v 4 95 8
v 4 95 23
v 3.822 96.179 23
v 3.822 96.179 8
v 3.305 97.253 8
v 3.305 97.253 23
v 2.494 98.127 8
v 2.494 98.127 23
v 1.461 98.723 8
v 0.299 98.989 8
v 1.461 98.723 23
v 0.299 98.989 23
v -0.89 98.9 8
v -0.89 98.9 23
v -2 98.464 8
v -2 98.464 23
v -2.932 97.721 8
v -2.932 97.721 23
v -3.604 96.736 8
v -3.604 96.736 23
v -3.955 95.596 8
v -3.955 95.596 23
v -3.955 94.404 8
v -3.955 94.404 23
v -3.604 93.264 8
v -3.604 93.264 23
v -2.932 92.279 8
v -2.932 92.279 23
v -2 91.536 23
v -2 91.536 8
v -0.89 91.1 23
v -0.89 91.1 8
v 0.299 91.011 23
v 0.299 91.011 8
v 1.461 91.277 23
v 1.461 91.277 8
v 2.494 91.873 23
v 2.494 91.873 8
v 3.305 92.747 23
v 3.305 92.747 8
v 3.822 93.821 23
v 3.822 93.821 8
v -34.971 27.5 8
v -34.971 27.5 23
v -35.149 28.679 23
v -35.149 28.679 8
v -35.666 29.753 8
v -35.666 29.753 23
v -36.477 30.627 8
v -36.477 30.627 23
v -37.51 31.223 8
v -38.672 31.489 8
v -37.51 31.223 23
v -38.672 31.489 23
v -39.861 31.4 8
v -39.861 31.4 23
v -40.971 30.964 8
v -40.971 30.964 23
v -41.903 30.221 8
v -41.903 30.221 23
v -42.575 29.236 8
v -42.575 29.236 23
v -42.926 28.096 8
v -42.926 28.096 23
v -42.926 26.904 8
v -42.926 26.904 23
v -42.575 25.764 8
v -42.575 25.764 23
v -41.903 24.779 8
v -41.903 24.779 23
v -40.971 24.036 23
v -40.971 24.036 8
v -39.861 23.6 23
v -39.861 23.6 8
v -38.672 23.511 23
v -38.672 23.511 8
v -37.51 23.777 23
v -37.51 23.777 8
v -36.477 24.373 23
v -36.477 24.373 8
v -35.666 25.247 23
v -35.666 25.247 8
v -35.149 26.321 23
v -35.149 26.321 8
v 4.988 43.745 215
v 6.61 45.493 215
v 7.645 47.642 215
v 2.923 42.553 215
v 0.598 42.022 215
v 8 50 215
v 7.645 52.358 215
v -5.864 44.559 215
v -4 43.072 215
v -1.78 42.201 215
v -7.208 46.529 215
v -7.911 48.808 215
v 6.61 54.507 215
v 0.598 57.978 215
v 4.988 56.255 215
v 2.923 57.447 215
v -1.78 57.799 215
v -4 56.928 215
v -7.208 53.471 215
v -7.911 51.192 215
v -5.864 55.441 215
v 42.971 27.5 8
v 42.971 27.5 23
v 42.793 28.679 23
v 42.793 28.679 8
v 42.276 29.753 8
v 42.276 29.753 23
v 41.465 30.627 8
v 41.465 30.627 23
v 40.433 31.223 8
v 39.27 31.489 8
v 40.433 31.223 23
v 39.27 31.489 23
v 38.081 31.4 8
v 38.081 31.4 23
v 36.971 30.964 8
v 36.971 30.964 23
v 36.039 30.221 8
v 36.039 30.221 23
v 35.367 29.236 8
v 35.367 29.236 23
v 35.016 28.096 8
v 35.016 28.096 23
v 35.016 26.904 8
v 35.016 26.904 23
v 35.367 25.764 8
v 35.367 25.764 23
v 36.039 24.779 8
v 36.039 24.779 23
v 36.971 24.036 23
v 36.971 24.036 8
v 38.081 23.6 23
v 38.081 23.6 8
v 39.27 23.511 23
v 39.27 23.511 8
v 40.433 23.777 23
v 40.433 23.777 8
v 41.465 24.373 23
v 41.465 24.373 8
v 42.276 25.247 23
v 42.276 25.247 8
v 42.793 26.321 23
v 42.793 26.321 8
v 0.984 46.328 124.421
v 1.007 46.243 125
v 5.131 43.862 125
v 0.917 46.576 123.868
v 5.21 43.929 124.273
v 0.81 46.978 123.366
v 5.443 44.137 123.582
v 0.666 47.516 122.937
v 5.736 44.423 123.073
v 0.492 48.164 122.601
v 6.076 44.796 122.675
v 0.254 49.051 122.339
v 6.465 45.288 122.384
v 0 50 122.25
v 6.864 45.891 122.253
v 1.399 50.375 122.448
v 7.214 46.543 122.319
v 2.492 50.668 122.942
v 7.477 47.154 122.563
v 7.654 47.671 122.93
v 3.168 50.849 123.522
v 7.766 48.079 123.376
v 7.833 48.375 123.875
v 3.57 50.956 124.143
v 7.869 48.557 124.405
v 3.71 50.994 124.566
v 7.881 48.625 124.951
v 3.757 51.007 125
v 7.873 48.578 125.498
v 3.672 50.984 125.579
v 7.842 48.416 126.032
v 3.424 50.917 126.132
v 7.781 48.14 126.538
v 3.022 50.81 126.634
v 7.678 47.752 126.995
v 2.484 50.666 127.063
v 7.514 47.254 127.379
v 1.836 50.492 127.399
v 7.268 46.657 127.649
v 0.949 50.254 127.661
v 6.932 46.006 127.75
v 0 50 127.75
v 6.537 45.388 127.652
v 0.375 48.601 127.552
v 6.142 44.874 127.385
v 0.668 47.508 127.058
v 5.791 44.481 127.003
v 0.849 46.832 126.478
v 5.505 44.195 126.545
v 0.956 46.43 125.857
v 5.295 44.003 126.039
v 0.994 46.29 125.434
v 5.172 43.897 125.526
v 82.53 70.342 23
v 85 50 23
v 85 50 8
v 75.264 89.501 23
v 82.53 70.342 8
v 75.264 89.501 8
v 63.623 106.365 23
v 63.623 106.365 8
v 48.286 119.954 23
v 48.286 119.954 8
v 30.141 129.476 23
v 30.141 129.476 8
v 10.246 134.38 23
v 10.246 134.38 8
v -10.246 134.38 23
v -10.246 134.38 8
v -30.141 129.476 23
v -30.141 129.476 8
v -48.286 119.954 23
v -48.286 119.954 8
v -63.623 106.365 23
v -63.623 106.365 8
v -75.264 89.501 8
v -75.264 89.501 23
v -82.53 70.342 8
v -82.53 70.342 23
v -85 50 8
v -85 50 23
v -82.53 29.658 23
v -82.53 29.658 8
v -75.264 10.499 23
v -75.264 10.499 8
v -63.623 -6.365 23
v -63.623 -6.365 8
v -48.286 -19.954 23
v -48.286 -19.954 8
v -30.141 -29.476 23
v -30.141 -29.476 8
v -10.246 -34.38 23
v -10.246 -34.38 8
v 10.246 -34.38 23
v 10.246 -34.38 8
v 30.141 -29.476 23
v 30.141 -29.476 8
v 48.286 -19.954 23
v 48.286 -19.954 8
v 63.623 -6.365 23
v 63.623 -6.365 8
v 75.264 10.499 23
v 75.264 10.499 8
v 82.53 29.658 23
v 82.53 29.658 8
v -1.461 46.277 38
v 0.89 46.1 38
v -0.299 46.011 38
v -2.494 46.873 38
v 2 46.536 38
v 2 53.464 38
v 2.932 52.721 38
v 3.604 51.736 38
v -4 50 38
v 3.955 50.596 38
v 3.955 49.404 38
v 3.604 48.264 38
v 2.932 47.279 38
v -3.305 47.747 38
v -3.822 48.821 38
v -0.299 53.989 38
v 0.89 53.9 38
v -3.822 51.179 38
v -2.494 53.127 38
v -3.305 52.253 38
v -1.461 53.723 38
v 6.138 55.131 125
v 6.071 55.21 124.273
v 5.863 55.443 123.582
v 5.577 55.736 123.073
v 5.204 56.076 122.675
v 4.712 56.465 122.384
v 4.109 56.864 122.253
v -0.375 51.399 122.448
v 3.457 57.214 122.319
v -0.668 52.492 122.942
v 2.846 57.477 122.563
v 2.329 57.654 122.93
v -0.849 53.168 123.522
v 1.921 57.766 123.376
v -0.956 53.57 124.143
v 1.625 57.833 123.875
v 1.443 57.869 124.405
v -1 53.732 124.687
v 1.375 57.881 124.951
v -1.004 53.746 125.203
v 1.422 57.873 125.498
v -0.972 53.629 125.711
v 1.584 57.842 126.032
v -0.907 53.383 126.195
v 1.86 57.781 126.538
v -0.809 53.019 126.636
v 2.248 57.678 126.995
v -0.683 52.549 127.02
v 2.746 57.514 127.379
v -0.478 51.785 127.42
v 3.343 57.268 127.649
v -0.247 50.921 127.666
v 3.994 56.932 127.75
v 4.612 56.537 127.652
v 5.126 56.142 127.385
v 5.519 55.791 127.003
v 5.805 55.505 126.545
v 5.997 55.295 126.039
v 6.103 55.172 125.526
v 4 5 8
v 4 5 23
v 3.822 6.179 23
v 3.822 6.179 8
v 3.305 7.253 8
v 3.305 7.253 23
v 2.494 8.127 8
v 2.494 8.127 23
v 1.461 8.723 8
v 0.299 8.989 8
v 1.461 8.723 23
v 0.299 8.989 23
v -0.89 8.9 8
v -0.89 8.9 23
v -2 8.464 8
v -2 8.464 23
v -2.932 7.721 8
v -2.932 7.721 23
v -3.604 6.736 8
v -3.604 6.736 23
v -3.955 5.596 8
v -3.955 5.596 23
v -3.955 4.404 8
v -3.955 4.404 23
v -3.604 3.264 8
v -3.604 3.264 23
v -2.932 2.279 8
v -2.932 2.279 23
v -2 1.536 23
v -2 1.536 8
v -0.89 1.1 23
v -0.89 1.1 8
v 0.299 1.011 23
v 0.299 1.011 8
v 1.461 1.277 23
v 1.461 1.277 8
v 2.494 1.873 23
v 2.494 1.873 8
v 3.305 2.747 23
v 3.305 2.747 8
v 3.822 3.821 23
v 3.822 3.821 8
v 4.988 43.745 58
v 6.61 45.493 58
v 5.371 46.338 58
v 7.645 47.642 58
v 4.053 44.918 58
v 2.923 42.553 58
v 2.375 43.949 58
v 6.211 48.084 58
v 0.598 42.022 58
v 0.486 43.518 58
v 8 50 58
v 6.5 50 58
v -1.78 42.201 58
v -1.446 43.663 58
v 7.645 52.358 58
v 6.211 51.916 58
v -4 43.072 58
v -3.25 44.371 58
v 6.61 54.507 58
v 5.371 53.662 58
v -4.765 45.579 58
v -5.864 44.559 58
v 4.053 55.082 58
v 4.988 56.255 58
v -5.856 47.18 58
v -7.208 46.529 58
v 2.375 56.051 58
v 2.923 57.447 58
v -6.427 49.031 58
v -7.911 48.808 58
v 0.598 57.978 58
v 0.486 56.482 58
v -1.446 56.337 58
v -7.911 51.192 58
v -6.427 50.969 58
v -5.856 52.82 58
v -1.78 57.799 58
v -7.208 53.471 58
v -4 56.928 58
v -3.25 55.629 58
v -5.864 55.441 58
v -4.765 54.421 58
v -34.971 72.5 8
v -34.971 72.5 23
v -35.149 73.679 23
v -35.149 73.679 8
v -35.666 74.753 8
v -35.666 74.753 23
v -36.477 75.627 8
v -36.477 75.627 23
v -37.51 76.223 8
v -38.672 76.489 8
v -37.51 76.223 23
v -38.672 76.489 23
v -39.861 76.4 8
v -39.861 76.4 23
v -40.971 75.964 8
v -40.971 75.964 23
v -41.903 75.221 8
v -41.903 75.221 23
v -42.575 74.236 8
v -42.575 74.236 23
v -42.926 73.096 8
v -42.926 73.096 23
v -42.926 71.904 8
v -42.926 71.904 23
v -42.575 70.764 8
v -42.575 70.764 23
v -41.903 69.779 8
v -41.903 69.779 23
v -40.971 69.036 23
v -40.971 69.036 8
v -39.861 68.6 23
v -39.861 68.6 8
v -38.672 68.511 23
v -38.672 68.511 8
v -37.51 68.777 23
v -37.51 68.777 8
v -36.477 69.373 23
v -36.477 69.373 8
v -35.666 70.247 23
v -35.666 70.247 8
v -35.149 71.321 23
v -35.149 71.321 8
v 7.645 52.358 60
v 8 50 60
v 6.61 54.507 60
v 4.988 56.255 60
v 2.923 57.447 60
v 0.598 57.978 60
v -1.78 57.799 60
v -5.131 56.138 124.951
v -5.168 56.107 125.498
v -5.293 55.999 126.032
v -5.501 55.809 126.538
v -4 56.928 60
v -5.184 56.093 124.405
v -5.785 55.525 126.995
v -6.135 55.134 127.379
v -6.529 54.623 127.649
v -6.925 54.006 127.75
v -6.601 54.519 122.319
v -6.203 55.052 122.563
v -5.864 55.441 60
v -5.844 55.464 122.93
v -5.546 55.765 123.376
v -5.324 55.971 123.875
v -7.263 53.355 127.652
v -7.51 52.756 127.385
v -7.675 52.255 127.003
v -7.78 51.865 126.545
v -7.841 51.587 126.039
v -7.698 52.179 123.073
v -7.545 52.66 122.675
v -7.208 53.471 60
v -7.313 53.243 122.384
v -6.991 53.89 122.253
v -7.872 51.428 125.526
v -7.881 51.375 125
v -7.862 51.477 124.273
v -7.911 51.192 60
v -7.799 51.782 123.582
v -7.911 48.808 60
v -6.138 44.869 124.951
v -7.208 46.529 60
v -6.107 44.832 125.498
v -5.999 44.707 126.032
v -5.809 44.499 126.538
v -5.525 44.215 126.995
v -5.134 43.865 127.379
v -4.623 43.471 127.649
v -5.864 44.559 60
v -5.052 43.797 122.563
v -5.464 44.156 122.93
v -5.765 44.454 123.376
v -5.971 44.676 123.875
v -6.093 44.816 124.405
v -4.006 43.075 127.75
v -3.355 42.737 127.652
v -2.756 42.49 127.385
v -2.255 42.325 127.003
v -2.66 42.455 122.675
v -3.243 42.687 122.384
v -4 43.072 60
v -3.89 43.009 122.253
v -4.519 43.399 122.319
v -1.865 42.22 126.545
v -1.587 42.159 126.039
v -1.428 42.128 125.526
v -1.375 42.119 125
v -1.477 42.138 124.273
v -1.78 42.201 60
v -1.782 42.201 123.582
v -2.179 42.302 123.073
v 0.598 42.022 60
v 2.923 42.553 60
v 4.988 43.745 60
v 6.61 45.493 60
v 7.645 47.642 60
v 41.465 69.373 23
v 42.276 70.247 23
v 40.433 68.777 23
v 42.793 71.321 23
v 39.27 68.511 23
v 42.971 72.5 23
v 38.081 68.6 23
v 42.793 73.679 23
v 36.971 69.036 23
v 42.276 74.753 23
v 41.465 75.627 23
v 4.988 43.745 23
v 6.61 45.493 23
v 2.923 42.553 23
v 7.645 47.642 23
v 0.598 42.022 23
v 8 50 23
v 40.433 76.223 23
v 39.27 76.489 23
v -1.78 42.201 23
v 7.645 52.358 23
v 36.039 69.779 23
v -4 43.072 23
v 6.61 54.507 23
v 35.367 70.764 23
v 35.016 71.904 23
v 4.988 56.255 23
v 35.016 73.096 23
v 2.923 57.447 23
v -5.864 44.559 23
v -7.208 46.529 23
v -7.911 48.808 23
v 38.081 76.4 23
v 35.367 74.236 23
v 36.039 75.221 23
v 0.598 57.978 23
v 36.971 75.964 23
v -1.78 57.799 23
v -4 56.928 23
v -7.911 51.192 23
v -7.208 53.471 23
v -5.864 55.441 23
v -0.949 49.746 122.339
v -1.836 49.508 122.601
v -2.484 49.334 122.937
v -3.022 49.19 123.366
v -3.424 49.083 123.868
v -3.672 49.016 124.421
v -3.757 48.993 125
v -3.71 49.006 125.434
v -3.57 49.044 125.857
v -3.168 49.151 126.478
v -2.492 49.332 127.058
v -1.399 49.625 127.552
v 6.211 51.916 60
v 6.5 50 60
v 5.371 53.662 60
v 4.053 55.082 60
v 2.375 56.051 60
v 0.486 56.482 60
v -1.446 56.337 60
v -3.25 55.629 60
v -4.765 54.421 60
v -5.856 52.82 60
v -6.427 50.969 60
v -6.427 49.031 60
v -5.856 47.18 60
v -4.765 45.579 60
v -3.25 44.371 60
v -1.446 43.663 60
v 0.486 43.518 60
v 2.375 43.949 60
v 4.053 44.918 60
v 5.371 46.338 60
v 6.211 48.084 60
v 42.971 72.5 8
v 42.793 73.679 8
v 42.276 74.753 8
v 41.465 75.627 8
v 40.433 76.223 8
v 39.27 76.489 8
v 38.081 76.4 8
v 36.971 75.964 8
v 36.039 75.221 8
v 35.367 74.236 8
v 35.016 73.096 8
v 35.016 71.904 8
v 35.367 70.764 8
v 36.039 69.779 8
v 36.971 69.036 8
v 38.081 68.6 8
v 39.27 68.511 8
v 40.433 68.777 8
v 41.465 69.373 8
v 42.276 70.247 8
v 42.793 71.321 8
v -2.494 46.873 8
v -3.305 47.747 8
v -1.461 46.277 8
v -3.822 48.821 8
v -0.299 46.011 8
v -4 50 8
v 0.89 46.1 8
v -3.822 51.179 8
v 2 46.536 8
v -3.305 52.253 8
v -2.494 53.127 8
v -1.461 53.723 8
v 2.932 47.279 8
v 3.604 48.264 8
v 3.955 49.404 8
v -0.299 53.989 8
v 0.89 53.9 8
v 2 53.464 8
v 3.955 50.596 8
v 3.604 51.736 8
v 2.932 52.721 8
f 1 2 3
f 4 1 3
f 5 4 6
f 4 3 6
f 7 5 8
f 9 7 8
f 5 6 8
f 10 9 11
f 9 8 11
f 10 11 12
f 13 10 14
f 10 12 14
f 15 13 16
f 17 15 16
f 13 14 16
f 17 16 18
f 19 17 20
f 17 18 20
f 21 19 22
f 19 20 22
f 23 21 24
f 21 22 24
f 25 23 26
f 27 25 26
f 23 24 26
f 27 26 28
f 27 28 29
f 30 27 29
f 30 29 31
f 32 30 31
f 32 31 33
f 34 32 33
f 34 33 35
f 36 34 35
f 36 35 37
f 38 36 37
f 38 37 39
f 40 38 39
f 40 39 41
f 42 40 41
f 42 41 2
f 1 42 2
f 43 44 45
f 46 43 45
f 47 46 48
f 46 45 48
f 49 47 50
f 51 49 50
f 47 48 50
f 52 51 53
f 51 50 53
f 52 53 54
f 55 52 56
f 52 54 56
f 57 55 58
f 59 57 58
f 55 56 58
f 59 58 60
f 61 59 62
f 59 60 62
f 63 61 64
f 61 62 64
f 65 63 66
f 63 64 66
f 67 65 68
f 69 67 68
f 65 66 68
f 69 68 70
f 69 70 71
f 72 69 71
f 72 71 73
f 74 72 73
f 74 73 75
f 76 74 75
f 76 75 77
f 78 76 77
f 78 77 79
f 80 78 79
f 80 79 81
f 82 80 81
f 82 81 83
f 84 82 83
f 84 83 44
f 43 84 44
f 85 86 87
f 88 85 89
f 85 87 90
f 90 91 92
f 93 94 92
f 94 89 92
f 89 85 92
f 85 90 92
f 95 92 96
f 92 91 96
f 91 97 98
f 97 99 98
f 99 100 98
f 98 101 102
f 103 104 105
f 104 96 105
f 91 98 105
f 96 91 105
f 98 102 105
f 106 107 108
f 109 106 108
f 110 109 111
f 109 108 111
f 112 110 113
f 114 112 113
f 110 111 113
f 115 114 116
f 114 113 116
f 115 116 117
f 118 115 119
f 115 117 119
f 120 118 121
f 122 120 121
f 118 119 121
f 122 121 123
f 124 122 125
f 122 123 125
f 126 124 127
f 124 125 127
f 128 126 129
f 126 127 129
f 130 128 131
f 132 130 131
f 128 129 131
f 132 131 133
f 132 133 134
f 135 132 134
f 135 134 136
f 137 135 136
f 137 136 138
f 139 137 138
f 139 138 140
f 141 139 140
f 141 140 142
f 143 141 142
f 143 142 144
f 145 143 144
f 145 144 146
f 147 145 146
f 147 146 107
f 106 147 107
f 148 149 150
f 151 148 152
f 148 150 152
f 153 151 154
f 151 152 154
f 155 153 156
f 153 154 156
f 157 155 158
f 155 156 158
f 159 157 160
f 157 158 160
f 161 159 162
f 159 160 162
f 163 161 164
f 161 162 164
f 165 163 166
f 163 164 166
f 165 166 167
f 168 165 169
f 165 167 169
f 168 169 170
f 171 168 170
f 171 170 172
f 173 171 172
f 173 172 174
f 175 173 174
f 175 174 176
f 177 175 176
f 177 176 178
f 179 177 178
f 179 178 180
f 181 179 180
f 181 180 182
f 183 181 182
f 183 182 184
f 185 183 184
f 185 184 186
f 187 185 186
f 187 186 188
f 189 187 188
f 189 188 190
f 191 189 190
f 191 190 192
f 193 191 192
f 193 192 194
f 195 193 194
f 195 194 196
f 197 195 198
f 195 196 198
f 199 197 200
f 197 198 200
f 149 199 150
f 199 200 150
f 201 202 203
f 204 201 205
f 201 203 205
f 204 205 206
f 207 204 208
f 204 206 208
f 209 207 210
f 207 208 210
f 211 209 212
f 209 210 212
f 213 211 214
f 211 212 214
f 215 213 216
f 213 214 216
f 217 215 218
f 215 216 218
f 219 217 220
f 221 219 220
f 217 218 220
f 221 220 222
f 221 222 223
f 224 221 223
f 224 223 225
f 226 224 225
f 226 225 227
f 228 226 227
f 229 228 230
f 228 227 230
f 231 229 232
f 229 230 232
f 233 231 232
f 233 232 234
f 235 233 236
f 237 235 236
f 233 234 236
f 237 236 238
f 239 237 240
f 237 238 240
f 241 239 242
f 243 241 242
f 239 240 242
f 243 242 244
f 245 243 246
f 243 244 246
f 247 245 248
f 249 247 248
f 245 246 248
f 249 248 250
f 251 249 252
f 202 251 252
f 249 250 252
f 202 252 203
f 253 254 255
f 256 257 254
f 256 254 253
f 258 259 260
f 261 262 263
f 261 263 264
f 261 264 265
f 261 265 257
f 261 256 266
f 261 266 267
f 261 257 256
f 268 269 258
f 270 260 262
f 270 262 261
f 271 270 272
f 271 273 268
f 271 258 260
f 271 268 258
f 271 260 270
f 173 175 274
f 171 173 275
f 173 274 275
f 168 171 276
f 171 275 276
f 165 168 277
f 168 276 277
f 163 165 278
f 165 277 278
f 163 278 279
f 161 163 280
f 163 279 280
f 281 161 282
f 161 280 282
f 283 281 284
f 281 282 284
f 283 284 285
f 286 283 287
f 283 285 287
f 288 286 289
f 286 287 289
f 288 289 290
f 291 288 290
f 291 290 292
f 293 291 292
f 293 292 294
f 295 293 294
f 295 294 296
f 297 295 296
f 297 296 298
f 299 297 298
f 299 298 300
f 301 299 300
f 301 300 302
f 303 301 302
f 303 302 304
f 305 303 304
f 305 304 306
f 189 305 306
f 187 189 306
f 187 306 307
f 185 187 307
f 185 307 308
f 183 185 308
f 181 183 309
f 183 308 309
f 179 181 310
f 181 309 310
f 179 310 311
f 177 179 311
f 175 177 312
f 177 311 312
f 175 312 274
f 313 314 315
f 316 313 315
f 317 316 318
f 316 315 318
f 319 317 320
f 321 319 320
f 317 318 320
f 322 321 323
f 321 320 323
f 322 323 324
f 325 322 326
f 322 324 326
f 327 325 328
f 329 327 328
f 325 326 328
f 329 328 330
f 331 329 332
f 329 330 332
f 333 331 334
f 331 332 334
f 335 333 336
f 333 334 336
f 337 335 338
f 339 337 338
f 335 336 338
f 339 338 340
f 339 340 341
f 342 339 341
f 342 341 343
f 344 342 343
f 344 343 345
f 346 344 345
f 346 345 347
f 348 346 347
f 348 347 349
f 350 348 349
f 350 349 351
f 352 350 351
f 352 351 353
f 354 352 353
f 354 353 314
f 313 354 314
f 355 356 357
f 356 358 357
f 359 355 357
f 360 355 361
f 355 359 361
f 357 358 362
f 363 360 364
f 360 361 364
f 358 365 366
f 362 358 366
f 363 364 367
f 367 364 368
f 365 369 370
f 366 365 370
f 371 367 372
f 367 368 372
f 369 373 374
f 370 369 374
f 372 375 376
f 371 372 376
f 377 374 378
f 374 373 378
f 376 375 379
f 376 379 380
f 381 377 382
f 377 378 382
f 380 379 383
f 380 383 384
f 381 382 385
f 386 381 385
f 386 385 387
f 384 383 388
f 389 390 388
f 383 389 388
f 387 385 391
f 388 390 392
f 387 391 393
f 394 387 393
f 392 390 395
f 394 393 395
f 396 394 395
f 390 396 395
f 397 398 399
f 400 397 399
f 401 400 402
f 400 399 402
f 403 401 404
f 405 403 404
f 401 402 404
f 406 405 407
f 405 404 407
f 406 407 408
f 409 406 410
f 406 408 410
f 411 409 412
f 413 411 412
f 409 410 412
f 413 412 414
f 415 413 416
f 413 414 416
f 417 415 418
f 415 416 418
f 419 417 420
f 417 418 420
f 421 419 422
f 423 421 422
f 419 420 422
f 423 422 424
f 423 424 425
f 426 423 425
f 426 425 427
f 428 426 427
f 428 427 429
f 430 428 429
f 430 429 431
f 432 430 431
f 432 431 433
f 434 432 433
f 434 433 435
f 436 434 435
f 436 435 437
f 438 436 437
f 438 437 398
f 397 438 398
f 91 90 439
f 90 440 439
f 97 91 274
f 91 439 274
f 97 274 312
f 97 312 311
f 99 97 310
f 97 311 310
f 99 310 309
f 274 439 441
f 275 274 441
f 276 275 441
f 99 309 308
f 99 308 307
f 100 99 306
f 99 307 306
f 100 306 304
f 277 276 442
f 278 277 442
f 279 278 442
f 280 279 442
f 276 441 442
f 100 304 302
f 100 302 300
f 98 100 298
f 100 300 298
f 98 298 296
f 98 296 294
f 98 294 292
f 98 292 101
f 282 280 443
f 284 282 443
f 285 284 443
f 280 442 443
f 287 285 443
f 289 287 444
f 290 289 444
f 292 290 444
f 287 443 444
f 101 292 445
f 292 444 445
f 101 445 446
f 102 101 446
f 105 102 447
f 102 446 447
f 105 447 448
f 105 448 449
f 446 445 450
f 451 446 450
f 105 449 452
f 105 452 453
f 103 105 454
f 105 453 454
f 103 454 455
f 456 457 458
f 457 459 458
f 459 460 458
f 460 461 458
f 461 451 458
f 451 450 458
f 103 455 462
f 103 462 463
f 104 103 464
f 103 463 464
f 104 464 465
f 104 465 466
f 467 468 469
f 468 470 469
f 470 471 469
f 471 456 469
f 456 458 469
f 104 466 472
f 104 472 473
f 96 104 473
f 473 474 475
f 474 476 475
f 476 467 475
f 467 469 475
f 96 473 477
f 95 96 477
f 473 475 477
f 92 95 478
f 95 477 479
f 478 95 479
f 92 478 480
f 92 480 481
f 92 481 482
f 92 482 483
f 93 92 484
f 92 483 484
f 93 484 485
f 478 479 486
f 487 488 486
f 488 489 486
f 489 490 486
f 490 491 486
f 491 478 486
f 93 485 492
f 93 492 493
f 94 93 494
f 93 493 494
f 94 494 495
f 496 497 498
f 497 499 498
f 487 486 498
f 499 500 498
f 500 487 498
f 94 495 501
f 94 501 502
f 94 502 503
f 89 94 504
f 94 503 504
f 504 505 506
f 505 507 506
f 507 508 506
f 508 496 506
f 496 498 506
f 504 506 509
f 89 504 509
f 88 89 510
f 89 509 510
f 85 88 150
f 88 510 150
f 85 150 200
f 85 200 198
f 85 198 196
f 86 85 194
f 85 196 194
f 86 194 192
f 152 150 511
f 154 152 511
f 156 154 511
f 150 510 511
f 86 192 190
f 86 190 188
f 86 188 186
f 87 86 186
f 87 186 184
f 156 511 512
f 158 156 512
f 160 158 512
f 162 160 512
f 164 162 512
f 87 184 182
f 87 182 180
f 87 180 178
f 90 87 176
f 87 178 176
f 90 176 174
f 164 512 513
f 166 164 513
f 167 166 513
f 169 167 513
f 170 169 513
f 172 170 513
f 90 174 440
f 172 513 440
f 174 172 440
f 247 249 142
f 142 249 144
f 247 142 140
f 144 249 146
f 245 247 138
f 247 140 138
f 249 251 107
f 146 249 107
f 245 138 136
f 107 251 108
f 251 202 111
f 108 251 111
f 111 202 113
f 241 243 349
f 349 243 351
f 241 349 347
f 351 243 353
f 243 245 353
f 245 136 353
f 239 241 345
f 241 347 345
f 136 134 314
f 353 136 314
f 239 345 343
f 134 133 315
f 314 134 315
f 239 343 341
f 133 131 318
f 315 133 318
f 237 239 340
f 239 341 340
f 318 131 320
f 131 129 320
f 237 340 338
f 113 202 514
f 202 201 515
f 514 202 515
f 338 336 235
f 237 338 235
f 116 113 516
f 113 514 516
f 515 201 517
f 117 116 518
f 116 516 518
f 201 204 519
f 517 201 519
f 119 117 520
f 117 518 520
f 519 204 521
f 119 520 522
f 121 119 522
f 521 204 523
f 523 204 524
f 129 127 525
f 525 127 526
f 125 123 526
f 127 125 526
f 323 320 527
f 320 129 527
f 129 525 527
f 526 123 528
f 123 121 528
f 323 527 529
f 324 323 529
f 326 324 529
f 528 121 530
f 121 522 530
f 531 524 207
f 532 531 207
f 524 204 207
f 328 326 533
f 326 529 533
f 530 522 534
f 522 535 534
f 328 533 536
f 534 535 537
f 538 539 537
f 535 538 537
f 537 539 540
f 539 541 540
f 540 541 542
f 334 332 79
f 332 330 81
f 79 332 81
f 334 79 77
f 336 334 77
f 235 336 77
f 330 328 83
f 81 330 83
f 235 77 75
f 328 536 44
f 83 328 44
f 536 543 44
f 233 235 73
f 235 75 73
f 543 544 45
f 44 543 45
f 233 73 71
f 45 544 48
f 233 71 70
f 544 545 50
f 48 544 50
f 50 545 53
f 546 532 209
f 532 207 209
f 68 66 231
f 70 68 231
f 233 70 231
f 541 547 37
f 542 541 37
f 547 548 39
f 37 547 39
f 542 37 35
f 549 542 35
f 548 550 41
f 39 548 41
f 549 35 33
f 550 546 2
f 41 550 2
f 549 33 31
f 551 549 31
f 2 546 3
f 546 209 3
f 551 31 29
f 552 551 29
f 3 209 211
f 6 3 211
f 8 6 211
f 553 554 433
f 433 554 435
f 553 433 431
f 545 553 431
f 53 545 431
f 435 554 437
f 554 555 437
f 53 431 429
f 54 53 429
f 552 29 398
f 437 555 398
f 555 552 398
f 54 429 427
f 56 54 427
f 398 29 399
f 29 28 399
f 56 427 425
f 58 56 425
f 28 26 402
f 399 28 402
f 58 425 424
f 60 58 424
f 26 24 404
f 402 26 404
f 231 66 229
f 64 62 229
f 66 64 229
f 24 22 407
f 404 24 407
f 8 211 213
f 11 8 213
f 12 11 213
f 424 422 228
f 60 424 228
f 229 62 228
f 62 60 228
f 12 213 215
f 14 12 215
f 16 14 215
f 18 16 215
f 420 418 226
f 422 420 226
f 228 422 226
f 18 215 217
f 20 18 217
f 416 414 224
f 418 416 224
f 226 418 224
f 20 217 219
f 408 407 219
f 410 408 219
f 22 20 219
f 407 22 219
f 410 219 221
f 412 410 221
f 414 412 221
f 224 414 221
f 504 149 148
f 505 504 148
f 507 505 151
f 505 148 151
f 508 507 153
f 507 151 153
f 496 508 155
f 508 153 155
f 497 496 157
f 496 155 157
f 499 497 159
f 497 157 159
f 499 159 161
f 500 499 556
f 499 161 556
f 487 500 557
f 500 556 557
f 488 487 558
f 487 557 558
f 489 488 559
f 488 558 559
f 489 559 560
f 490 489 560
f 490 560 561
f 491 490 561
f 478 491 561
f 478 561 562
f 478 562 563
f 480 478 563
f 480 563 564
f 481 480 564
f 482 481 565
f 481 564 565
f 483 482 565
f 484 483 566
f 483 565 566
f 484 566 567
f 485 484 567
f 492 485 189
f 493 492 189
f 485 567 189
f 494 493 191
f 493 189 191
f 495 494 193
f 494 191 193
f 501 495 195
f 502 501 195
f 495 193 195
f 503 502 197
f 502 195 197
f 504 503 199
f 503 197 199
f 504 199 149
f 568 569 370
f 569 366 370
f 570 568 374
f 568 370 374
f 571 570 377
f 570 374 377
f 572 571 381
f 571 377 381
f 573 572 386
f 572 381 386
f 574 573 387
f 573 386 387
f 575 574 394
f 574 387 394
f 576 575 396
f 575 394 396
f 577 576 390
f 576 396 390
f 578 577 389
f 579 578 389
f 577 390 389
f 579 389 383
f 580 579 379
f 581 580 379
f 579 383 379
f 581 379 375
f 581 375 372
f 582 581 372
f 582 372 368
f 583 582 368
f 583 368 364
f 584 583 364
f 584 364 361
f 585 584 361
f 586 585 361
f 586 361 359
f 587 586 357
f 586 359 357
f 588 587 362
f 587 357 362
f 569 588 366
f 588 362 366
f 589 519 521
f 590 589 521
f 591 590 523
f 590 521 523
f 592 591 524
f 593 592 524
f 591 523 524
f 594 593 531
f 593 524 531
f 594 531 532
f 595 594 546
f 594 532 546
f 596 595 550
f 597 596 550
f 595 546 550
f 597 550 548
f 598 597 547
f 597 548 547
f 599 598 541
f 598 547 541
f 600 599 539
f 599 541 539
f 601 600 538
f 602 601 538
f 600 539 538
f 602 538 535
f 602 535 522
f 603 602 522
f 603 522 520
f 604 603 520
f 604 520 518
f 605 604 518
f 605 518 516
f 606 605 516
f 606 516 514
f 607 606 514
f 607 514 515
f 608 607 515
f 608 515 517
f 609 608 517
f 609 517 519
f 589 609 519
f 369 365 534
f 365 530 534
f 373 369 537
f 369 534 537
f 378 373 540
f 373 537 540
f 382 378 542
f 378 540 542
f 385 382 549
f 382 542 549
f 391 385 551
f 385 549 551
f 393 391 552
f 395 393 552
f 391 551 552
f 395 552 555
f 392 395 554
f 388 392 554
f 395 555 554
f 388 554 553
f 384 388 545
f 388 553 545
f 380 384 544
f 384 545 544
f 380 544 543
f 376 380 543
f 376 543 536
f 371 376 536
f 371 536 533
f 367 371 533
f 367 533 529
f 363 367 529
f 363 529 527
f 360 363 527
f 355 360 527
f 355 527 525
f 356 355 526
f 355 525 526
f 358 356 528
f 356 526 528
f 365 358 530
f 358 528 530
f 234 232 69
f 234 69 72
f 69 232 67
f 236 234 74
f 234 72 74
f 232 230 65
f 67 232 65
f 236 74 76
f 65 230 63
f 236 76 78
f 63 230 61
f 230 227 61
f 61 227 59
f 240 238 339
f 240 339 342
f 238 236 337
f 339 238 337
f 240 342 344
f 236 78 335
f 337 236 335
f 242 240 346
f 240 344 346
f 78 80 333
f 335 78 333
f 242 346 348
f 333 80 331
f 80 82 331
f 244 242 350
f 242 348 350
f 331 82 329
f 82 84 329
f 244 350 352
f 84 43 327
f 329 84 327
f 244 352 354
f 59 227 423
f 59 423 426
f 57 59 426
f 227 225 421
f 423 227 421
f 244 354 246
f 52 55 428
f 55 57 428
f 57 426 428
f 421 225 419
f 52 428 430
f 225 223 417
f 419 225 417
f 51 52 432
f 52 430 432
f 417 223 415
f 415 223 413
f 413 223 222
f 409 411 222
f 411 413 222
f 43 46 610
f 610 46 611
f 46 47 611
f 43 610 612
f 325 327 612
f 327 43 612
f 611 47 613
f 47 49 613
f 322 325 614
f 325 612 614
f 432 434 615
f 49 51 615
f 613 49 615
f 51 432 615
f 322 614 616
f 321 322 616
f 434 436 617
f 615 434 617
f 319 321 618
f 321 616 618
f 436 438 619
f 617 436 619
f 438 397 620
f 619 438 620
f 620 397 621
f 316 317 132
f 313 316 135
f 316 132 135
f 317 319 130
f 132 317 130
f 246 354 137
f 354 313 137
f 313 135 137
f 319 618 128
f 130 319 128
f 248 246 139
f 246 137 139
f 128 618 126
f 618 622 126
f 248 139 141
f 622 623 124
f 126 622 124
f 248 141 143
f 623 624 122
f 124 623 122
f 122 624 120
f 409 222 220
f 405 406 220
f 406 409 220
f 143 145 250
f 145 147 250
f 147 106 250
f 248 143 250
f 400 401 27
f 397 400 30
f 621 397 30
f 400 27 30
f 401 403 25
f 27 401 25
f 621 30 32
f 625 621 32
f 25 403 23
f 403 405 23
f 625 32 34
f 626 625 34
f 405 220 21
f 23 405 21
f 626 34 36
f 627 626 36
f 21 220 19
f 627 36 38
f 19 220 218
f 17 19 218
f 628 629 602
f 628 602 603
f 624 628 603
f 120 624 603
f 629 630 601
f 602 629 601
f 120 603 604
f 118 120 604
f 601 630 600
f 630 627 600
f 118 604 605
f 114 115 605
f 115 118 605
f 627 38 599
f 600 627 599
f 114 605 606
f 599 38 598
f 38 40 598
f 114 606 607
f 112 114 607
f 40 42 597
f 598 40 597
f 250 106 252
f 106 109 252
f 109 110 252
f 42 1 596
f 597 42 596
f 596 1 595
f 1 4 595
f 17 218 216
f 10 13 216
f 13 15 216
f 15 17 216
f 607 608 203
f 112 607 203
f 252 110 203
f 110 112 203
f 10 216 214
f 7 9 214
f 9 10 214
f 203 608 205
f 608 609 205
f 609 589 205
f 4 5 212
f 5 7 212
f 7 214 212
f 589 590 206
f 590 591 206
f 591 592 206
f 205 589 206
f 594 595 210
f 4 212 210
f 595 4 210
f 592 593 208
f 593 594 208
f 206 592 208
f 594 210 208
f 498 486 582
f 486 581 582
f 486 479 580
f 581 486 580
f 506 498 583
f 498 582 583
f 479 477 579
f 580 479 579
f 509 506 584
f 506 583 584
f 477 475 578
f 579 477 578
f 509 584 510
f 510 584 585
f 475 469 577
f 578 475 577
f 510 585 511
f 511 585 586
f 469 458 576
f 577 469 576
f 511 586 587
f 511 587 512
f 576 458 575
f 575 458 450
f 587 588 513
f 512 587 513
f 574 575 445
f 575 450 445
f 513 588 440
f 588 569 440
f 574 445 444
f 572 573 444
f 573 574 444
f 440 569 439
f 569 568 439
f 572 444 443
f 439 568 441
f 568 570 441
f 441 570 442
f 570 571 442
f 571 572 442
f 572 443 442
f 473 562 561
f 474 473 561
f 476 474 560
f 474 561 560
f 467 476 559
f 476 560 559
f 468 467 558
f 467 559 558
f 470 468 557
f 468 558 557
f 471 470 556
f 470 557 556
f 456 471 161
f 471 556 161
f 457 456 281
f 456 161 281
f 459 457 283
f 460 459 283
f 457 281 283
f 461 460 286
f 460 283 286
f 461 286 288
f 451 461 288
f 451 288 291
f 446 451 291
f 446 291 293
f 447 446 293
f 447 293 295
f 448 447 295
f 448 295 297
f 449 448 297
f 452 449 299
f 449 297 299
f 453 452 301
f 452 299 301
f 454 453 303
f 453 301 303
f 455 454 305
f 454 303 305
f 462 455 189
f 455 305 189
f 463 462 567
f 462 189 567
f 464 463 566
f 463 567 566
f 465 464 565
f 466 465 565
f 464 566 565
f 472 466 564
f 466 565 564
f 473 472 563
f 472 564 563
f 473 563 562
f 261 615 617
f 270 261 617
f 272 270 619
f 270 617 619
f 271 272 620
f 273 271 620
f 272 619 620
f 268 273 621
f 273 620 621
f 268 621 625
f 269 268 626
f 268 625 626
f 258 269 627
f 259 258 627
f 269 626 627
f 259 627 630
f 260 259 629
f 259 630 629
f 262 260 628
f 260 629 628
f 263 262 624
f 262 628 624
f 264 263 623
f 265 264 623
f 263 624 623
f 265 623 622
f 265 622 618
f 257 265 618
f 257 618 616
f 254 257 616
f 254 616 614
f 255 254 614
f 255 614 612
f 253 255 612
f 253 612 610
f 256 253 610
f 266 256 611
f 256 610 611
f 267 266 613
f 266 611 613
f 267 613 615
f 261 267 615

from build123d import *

# Parameters (mm, degrees)
F_8_0MM_DOWEL_HOLE1_D     = 8
F_8_0MM_DOWEL_HOLE1_DEPTH = 30
F_8_0MM_DOWEL_HOLE1_TIP   = 2.403442476
SKETCH10_R                = 2.75
CUT_EXTRUDE1_DEPTH        = 260
SKETCH11_R                = 2.75
CUT_EXTRUDE2_DEPTH        = 260
SKETCH12_R                = 4
CUT_EXTRUDE3_DEPTH        = 30


with BuildPart() as part:
    # Sketch1 → Revolve1 (revolve)
    with BuildSketch(Plane(origin=(0, 50, 0), x_dir=(1, 0, 0), z_dir=(0, 1, 0))):
        Polygon((85, -8), (0, -8), (0, -215), (8, -215), (8, -60), (6.5, -60), (6.5, -58), (8, -58), (8, -23), (85, -23), align=None)
    revolve(axis=Axis((0, 50, 8), (0, 0, 1)))

    # Ø8.0mm Dowel Hole1
    with Locations(Plane(origin=(0, 0, 8), x_dir=(-1, 0, 0), z_dir=(0, 0, -1))):
        with Locations((0, 95), (-38.97114317, 72.5), (-38.97114317, 27.5), (0, 5), (38.97114317, 27.5), (38.97114317, 72.5)):
            Hole(F_8_0MM_DOWEL_HOLE1_D / 2, depth=F_8_0MM_DOWEL_HOLE1_DEPTH)
            with Locations((0, 0, -(F_8_0MM_DOWEL_HOLE1_DEPTH + F_8_0MM_DOWEL_HOLE1_TIP / 2))):  # 118° drill point
                Cone(0, F_8_0MM_DOWEL_HOLE1_D / 2, F_8_0MM_DOWEL_HOLE1_TIP, mode=Mode.SUBTRACT)

    # Sketch10 → Cut-Extrude1 (cut)
    with BuildSketch(Plane(origin=(138.275547742, -79.833424711, 0), x_dir=(-0.5, -0.866025404, 0), z_dir=(0.866025404, -0.5, 0))):
        with Locations((-43.301270189, -125)):
            Circle(SKETCH10_R)
    extrude(amount=-CUT_EXTRUDE1_DEPTH, mode=Mode.SUBTRACT)

    # Sketch11 → Cut-Extrude2 (cut)
    with BuildSketch(Plane(origin=(46.091849247, 79.833424711, 0), x_dir=(0.866025404, -0.5, 0), z_dir=(0.5, 0.866025404, 0))):
        with Locations((-25, -125)):
            Circle(SKETCH11_R)
    extrude(amount=-CUT_EXTRUDE2_DEPTH, mode=Mode.SUBTRACT)

    # Sketch12 → Cut-Extrude3 (cut)
    with BuildSketch(Plane(origin=(0, 0, 8), x_dir=(-1, 0, 0), z_dir=(0, 0, -1))):
        with Locations((0, 50)):
            Circle(SKETCH12_R)
    extrude(amount=-CUT_EXTRUDE3_DEPTH, mode=Mode.SUBTRACT)


solid = part.part
